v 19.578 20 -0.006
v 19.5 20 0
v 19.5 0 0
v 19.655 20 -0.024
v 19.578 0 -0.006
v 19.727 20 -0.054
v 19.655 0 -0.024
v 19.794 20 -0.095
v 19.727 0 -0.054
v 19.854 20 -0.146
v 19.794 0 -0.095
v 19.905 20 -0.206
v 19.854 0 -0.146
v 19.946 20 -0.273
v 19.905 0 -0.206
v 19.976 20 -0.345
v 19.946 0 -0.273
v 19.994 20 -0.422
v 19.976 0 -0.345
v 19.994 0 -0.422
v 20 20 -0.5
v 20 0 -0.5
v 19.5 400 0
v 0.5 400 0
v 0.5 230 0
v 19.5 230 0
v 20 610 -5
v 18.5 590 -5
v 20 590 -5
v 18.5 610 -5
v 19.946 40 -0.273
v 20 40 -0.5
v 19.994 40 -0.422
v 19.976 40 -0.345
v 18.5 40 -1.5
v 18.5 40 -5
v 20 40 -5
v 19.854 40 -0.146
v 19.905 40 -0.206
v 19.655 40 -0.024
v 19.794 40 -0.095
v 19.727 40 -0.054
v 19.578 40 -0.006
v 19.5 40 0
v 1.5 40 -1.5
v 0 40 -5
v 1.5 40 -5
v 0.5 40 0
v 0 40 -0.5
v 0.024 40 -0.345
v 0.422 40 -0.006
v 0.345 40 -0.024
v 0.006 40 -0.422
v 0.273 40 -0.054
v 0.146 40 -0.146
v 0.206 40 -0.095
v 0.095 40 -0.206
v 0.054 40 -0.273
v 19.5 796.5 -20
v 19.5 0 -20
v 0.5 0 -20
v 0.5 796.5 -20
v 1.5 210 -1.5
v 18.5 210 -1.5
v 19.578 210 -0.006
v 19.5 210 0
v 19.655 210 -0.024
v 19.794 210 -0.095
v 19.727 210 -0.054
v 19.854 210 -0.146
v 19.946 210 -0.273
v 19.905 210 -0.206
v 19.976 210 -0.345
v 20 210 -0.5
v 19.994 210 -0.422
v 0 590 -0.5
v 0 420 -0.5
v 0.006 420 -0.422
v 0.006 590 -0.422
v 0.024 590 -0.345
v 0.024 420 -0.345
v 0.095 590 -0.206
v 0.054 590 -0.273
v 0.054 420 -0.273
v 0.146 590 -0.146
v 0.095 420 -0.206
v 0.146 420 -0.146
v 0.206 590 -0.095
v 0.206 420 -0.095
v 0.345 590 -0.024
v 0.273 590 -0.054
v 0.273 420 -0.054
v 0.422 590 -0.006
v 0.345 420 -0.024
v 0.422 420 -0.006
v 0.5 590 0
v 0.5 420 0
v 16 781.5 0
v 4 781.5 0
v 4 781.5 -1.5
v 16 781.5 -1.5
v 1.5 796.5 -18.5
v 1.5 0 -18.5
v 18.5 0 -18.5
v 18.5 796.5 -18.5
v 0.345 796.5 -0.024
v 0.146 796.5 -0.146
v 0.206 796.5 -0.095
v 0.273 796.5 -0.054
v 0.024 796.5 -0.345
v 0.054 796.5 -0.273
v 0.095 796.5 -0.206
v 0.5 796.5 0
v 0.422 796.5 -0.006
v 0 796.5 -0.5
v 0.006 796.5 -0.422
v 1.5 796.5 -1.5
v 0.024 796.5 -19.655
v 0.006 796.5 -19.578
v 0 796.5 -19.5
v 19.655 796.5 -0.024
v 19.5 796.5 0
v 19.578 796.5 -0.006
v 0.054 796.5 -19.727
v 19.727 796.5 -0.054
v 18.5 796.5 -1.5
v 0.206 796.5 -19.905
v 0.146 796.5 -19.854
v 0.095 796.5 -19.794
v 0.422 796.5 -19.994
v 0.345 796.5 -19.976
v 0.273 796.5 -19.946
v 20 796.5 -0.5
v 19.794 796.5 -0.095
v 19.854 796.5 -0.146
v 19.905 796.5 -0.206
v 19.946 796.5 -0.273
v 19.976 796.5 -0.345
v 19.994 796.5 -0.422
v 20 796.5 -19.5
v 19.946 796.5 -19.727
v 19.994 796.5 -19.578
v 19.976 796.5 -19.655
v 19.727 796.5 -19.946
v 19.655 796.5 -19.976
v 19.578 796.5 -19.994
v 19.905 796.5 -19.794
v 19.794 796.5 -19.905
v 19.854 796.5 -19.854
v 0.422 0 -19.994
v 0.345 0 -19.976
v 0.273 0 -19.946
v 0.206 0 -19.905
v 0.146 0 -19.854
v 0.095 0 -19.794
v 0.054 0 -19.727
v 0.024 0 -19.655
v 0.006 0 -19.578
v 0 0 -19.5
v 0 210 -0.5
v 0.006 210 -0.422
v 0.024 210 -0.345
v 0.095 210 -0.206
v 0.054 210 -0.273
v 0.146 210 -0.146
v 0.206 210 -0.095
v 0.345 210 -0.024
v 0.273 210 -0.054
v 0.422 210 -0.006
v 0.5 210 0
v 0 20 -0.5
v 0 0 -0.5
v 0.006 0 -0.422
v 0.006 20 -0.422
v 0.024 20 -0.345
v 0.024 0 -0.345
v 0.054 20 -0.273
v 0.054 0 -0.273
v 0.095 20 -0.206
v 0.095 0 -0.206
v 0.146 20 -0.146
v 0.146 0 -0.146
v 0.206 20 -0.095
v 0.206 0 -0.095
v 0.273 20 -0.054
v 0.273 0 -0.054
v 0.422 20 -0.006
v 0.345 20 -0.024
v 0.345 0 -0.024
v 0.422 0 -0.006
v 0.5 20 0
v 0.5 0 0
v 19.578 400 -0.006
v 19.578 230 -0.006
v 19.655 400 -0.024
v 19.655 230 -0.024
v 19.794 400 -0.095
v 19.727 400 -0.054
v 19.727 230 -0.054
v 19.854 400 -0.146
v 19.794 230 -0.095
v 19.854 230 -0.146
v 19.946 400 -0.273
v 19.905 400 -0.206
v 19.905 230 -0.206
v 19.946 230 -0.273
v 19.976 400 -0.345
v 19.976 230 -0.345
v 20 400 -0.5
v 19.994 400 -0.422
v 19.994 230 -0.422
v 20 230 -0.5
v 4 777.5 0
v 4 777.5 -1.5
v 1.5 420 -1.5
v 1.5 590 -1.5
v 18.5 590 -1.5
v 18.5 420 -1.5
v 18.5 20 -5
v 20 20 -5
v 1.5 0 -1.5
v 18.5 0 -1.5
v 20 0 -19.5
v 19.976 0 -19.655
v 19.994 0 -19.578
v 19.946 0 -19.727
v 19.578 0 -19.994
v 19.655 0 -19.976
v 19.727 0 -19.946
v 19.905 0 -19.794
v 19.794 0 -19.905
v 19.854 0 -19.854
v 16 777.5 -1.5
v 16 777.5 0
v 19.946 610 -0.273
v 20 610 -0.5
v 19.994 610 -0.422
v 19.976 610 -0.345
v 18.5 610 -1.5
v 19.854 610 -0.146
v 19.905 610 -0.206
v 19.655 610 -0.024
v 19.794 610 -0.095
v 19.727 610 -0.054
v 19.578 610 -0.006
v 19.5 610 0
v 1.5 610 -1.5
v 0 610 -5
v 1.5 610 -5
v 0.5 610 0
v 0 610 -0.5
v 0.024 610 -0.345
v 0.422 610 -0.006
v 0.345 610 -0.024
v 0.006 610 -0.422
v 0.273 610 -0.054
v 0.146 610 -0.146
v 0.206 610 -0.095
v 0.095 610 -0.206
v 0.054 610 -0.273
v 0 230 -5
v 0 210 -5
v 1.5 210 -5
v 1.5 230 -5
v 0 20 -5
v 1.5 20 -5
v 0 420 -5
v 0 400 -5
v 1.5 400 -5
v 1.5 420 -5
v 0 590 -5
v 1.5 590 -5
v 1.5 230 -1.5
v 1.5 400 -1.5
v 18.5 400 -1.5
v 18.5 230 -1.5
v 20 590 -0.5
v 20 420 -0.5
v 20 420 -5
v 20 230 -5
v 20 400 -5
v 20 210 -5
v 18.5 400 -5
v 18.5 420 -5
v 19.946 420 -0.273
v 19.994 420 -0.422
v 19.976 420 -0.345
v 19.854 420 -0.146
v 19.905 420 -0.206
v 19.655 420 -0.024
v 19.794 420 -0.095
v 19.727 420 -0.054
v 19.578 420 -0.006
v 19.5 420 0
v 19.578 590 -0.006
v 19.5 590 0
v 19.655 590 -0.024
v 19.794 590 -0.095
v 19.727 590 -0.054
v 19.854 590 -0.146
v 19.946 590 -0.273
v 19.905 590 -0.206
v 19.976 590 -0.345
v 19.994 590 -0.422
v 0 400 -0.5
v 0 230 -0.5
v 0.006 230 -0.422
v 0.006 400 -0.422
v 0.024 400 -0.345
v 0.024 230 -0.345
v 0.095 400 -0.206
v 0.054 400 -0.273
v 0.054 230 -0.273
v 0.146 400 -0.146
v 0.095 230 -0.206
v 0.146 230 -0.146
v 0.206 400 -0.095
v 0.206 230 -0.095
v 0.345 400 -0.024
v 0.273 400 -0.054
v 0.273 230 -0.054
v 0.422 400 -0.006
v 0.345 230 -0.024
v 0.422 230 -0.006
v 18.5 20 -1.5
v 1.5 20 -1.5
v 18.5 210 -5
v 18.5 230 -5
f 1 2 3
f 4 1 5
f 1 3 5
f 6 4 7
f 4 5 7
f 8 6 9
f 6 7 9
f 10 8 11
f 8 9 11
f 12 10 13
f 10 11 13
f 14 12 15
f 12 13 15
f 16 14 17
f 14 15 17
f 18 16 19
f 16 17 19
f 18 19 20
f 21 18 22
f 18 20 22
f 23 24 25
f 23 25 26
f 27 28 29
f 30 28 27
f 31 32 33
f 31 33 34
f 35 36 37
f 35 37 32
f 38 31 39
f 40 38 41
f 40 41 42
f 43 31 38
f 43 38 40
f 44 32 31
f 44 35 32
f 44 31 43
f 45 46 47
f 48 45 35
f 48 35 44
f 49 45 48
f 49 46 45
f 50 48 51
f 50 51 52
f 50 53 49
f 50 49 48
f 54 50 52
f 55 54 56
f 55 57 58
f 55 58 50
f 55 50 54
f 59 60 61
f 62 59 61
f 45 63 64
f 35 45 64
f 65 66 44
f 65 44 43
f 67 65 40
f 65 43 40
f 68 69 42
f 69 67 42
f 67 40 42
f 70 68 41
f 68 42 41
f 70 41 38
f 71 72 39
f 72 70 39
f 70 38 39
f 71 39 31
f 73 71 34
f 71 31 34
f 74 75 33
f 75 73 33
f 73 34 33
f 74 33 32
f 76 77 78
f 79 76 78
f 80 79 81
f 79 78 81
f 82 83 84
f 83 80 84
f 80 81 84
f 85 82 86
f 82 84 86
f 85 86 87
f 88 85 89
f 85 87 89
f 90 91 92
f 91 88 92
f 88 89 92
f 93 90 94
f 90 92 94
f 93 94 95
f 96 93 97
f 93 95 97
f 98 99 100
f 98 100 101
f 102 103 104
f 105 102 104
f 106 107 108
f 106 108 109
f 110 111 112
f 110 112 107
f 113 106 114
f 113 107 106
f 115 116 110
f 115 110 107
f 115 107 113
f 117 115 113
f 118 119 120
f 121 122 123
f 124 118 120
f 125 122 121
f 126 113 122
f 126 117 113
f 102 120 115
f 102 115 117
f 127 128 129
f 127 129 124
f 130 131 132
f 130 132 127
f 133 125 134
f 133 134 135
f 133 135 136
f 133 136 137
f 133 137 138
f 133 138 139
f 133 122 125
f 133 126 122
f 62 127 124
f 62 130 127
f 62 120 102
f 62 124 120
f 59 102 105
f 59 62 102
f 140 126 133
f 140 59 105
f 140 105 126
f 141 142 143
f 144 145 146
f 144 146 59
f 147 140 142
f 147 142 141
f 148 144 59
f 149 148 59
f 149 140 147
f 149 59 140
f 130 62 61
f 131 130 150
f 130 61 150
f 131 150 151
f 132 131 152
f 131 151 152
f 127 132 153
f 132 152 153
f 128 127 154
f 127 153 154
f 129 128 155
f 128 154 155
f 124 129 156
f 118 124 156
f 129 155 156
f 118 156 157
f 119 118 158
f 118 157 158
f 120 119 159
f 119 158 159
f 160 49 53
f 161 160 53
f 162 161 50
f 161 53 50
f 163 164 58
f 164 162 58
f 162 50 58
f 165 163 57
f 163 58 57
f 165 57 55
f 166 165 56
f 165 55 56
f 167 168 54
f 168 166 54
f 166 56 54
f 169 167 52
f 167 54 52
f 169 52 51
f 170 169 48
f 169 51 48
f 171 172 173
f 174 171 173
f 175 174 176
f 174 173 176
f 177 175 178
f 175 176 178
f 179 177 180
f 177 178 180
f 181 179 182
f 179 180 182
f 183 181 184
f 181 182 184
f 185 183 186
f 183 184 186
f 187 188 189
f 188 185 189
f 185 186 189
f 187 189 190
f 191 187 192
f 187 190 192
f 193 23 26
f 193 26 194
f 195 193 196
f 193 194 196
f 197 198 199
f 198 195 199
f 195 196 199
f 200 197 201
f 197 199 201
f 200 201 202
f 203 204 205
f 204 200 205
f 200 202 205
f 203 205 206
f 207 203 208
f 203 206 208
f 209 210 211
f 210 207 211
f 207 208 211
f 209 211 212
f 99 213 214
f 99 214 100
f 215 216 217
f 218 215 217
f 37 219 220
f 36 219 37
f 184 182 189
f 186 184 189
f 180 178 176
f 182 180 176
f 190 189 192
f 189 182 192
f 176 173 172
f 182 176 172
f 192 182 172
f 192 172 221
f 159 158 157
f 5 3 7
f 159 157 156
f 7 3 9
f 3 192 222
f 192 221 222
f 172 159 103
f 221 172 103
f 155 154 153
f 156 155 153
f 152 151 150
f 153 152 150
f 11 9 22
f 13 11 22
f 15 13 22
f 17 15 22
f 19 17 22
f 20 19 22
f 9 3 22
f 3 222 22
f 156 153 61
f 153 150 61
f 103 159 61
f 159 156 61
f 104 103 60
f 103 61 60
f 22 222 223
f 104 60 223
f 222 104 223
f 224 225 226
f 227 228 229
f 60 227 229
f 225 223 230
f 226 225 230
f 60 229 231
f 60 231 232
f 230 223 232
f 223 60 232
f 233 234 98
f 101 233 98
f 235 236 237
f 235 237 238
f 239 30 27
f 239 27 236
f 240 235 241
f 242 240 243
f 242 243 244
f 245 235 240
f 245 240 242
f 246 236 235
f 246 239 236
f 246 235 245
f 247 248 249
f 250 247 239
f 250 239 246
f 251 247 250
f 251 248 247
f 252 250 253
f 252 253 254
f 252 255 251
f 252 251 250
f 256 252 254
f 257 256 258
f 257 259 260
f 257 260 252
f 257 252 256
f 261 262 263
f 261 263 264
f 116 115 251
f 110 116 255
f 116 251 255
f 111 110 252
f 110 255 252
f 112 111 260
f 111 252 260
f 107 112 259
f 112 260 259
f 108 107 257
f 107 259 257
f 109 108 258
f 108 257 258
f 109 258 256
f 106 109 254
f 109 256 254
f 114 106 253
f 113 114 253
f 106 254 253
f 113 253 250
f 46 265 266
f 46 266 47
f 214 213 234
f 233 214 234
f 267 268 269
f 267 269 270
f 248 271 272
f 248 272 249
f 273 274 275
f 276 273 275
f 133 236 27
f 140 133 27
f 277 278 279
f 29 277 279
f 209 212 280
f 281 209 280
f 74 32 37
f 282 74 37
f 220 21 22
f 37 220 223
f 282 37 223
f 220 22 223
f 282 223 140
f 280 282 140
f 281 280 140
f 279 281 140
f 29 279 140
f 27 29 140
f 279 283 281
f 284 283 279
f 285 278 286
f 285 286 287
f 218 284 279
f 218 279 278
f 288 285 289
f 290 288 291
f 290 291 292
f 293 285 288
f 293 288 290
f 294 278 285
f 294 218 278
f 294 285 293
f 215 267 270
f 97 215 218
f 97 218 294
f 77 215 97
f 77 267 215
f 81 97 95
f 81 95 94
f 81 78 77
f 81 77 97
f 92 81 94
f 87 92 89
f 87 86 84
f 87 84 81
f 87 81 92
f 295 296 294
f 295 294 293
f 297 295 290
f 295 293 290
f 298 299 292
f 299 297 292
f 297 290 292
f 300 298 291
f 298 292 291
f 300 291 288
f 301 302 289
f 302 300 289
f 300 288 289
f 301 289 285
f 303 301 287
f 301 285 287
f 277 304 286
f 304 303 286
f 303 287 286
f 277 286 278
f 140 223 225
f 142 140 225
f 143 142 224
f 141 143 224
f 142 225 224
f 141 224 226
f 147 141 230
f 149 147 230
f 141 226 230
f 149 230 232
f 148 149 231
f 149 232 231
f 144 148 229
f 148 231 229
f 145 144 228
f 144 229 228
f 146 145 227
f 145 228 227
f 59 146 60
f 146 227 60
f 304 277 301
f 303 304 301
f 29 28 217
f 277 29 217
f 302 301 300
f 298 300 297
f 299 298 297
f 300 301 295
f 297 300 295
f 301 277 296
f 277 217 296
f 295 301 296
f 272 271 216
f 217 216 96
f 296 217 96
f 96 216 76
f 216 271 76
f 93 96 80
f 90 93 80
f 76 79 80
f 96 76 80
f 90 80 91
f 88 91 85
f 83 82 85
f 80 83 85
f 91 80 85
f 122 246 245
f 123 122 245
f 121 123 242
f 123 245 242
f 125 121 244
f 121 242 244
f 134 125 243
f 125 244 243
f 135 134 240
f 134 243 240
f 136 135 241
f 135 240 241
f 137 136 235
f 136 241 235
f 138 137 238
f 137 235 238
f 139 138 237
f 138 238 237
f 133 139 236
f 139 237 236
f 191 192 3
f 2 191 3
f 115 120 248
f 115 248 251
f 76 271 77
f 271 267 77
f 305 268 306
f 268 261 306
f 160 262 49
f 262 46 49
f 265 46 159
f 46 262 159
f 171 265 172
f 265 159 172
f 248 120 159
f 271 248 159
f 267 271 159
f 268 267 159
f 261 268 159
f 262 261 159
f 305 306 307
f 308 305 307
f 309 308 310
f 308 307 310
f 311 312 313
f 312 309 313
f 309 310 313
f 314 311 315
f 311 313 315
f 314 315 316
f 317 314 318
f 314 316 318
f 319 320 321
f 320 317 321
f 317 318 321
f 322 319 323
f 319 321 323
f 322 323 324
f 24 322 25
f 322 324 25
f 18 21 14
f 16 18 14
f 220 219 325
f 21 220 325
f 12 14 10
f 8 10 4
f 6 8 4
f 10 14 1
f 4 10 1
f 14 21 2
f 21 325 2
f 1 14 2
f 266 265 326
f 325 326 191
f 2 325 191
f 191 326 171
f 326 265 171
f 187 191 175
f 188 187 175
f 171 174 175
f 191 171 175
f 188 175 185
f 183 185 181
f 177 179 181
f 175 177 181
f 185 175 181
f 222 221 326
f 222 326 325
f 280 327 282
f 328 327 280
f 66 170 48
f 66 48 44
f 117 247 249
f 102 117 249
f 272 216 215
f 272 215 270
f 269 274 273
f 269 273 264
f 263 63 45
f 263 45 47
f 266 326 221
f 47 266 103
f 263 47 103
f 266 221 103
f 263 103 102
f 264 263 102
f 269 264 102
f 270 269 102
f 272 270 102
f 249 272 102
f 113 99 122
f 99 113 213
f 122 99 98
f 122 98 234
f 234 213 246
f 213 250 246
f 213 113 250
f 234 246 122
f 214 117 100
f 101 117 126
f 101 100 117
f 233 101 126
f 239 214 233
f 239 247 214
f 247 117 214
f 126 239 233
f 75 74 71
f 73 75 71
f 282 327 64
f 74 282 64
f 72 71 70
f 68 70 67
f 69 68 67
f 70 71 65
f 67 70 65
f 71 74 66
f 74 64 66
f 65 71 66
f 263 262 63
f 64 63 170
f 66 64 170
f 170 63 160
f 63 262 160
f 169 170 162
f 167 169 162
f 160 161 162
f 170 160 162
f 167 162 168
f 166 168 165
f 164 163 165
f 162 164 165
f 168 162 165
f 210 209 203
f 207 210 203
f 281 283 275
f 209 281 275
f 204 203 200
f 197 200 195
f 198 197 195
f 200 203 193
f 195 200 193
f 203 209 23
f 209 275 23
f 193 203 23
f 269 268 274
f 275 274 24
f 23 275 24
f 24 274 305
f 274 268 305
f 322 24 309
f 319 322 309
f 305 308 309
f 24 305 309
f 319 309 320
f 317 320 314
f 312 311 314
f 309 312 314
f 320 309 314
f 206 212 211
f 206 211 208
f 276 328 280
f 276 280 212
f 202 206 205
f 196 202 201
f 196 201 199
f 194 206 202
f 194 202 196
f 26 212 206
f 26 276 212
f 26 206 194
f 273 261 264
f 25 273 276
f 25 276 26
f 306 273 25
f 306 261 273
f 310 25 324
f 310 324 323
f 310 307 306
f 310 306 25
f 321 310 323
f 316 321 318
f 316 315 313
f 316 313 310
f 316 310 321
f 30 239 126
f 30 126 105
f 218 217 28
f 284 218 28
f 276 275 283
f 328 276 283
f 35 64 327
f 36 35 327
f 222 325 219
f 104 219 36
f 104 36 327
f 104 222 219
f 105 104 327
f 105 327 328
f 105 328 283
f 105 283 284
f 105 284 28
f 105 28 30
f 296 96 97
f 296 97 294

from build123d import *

# Parameters (mm, degrees)
SKETCH1_W           = 17
SKETCH1_H           = 17
BOSS_EXTRUDE1_DEPTH = 796.5
SKETCH3_W           = 12
SKETCH3_H           = 4
CUT_EXTRUDE1_DEPTH  = 10
SKETCH5_W           = 5
SKETCH5_H           = 20
CUT_EXTRUDE2_DEPTH  = 798.002038893


with BuildPart() as part:
    # Sketch1 → Boss-Extrude1 (new body)
    with BuildSketch(Plane(origin=(0, 0, 0), x_dir=(1, 0, 0), z_dir=(0, 1, 0))):
        with BuildLine():
            Line((0.5, 0), (19.5, 0))
            ThreePointArc((19.5, 0), (19.853553391, 0.146446609), (20, 0.5))
            Line((20, 0.5), (20, 19.5))
            ThreePointArc((20, 19.5), (19.853553391, 19.853553391), (19.5, 20))
            Line((19.5, 20), (0.5, 20))
            ThreePointArc((0.5, 20), (0.146446609, 19.853553391), (0, 19.5))
            Line((0, 19.5), (0, 0.5))
            ThreePointArc((0, 0.5), (0.146446609, 0.146446609), (0.5, 0))
        make_face()
        with Locations((10, 10)):
            Rectangle(SKETCH1_W, SKETCH1_H, mode=Mode.SUBTRACT)
    extrude(amount=BOSS_EXTRUDE1_DEPTH)

    # Sketch3 → Cut-Extrude1 (cut)
    with BuildSketch(Plane.XY):
        with Locations((10, 779.5)):
            Rectangle(SKETCH3_W, SKETCH3_H)
    extrude(amount=-CUT_EXTRUDE1_DEPTH, mode=Mode.SUBTRACT)

    # Sketch5 → Cut-Extrude2 (cut, through all)
    with BuildSketch(Plane.ZY):
        with Locations((-2.5, 600)):
            Rectangle(SKETCH5_W, SKETCH5_H)
        with Locations((-2.5, 410)):
            Rectangle(SKETCH5_W, SKETCH5_H)
        with Locations((-2.5, 220)):
            Rectangle(SKETCH5_W, SKETCH5_H)
        with Locations((-2.5, 30)):
            Rectangle(SKETCH5_W, SKETCH5_H)
    extrude(amount=-CUT_EXTRUDE2_DEPTH, mode=Mode.SUBTRACT)


solid = part.part
